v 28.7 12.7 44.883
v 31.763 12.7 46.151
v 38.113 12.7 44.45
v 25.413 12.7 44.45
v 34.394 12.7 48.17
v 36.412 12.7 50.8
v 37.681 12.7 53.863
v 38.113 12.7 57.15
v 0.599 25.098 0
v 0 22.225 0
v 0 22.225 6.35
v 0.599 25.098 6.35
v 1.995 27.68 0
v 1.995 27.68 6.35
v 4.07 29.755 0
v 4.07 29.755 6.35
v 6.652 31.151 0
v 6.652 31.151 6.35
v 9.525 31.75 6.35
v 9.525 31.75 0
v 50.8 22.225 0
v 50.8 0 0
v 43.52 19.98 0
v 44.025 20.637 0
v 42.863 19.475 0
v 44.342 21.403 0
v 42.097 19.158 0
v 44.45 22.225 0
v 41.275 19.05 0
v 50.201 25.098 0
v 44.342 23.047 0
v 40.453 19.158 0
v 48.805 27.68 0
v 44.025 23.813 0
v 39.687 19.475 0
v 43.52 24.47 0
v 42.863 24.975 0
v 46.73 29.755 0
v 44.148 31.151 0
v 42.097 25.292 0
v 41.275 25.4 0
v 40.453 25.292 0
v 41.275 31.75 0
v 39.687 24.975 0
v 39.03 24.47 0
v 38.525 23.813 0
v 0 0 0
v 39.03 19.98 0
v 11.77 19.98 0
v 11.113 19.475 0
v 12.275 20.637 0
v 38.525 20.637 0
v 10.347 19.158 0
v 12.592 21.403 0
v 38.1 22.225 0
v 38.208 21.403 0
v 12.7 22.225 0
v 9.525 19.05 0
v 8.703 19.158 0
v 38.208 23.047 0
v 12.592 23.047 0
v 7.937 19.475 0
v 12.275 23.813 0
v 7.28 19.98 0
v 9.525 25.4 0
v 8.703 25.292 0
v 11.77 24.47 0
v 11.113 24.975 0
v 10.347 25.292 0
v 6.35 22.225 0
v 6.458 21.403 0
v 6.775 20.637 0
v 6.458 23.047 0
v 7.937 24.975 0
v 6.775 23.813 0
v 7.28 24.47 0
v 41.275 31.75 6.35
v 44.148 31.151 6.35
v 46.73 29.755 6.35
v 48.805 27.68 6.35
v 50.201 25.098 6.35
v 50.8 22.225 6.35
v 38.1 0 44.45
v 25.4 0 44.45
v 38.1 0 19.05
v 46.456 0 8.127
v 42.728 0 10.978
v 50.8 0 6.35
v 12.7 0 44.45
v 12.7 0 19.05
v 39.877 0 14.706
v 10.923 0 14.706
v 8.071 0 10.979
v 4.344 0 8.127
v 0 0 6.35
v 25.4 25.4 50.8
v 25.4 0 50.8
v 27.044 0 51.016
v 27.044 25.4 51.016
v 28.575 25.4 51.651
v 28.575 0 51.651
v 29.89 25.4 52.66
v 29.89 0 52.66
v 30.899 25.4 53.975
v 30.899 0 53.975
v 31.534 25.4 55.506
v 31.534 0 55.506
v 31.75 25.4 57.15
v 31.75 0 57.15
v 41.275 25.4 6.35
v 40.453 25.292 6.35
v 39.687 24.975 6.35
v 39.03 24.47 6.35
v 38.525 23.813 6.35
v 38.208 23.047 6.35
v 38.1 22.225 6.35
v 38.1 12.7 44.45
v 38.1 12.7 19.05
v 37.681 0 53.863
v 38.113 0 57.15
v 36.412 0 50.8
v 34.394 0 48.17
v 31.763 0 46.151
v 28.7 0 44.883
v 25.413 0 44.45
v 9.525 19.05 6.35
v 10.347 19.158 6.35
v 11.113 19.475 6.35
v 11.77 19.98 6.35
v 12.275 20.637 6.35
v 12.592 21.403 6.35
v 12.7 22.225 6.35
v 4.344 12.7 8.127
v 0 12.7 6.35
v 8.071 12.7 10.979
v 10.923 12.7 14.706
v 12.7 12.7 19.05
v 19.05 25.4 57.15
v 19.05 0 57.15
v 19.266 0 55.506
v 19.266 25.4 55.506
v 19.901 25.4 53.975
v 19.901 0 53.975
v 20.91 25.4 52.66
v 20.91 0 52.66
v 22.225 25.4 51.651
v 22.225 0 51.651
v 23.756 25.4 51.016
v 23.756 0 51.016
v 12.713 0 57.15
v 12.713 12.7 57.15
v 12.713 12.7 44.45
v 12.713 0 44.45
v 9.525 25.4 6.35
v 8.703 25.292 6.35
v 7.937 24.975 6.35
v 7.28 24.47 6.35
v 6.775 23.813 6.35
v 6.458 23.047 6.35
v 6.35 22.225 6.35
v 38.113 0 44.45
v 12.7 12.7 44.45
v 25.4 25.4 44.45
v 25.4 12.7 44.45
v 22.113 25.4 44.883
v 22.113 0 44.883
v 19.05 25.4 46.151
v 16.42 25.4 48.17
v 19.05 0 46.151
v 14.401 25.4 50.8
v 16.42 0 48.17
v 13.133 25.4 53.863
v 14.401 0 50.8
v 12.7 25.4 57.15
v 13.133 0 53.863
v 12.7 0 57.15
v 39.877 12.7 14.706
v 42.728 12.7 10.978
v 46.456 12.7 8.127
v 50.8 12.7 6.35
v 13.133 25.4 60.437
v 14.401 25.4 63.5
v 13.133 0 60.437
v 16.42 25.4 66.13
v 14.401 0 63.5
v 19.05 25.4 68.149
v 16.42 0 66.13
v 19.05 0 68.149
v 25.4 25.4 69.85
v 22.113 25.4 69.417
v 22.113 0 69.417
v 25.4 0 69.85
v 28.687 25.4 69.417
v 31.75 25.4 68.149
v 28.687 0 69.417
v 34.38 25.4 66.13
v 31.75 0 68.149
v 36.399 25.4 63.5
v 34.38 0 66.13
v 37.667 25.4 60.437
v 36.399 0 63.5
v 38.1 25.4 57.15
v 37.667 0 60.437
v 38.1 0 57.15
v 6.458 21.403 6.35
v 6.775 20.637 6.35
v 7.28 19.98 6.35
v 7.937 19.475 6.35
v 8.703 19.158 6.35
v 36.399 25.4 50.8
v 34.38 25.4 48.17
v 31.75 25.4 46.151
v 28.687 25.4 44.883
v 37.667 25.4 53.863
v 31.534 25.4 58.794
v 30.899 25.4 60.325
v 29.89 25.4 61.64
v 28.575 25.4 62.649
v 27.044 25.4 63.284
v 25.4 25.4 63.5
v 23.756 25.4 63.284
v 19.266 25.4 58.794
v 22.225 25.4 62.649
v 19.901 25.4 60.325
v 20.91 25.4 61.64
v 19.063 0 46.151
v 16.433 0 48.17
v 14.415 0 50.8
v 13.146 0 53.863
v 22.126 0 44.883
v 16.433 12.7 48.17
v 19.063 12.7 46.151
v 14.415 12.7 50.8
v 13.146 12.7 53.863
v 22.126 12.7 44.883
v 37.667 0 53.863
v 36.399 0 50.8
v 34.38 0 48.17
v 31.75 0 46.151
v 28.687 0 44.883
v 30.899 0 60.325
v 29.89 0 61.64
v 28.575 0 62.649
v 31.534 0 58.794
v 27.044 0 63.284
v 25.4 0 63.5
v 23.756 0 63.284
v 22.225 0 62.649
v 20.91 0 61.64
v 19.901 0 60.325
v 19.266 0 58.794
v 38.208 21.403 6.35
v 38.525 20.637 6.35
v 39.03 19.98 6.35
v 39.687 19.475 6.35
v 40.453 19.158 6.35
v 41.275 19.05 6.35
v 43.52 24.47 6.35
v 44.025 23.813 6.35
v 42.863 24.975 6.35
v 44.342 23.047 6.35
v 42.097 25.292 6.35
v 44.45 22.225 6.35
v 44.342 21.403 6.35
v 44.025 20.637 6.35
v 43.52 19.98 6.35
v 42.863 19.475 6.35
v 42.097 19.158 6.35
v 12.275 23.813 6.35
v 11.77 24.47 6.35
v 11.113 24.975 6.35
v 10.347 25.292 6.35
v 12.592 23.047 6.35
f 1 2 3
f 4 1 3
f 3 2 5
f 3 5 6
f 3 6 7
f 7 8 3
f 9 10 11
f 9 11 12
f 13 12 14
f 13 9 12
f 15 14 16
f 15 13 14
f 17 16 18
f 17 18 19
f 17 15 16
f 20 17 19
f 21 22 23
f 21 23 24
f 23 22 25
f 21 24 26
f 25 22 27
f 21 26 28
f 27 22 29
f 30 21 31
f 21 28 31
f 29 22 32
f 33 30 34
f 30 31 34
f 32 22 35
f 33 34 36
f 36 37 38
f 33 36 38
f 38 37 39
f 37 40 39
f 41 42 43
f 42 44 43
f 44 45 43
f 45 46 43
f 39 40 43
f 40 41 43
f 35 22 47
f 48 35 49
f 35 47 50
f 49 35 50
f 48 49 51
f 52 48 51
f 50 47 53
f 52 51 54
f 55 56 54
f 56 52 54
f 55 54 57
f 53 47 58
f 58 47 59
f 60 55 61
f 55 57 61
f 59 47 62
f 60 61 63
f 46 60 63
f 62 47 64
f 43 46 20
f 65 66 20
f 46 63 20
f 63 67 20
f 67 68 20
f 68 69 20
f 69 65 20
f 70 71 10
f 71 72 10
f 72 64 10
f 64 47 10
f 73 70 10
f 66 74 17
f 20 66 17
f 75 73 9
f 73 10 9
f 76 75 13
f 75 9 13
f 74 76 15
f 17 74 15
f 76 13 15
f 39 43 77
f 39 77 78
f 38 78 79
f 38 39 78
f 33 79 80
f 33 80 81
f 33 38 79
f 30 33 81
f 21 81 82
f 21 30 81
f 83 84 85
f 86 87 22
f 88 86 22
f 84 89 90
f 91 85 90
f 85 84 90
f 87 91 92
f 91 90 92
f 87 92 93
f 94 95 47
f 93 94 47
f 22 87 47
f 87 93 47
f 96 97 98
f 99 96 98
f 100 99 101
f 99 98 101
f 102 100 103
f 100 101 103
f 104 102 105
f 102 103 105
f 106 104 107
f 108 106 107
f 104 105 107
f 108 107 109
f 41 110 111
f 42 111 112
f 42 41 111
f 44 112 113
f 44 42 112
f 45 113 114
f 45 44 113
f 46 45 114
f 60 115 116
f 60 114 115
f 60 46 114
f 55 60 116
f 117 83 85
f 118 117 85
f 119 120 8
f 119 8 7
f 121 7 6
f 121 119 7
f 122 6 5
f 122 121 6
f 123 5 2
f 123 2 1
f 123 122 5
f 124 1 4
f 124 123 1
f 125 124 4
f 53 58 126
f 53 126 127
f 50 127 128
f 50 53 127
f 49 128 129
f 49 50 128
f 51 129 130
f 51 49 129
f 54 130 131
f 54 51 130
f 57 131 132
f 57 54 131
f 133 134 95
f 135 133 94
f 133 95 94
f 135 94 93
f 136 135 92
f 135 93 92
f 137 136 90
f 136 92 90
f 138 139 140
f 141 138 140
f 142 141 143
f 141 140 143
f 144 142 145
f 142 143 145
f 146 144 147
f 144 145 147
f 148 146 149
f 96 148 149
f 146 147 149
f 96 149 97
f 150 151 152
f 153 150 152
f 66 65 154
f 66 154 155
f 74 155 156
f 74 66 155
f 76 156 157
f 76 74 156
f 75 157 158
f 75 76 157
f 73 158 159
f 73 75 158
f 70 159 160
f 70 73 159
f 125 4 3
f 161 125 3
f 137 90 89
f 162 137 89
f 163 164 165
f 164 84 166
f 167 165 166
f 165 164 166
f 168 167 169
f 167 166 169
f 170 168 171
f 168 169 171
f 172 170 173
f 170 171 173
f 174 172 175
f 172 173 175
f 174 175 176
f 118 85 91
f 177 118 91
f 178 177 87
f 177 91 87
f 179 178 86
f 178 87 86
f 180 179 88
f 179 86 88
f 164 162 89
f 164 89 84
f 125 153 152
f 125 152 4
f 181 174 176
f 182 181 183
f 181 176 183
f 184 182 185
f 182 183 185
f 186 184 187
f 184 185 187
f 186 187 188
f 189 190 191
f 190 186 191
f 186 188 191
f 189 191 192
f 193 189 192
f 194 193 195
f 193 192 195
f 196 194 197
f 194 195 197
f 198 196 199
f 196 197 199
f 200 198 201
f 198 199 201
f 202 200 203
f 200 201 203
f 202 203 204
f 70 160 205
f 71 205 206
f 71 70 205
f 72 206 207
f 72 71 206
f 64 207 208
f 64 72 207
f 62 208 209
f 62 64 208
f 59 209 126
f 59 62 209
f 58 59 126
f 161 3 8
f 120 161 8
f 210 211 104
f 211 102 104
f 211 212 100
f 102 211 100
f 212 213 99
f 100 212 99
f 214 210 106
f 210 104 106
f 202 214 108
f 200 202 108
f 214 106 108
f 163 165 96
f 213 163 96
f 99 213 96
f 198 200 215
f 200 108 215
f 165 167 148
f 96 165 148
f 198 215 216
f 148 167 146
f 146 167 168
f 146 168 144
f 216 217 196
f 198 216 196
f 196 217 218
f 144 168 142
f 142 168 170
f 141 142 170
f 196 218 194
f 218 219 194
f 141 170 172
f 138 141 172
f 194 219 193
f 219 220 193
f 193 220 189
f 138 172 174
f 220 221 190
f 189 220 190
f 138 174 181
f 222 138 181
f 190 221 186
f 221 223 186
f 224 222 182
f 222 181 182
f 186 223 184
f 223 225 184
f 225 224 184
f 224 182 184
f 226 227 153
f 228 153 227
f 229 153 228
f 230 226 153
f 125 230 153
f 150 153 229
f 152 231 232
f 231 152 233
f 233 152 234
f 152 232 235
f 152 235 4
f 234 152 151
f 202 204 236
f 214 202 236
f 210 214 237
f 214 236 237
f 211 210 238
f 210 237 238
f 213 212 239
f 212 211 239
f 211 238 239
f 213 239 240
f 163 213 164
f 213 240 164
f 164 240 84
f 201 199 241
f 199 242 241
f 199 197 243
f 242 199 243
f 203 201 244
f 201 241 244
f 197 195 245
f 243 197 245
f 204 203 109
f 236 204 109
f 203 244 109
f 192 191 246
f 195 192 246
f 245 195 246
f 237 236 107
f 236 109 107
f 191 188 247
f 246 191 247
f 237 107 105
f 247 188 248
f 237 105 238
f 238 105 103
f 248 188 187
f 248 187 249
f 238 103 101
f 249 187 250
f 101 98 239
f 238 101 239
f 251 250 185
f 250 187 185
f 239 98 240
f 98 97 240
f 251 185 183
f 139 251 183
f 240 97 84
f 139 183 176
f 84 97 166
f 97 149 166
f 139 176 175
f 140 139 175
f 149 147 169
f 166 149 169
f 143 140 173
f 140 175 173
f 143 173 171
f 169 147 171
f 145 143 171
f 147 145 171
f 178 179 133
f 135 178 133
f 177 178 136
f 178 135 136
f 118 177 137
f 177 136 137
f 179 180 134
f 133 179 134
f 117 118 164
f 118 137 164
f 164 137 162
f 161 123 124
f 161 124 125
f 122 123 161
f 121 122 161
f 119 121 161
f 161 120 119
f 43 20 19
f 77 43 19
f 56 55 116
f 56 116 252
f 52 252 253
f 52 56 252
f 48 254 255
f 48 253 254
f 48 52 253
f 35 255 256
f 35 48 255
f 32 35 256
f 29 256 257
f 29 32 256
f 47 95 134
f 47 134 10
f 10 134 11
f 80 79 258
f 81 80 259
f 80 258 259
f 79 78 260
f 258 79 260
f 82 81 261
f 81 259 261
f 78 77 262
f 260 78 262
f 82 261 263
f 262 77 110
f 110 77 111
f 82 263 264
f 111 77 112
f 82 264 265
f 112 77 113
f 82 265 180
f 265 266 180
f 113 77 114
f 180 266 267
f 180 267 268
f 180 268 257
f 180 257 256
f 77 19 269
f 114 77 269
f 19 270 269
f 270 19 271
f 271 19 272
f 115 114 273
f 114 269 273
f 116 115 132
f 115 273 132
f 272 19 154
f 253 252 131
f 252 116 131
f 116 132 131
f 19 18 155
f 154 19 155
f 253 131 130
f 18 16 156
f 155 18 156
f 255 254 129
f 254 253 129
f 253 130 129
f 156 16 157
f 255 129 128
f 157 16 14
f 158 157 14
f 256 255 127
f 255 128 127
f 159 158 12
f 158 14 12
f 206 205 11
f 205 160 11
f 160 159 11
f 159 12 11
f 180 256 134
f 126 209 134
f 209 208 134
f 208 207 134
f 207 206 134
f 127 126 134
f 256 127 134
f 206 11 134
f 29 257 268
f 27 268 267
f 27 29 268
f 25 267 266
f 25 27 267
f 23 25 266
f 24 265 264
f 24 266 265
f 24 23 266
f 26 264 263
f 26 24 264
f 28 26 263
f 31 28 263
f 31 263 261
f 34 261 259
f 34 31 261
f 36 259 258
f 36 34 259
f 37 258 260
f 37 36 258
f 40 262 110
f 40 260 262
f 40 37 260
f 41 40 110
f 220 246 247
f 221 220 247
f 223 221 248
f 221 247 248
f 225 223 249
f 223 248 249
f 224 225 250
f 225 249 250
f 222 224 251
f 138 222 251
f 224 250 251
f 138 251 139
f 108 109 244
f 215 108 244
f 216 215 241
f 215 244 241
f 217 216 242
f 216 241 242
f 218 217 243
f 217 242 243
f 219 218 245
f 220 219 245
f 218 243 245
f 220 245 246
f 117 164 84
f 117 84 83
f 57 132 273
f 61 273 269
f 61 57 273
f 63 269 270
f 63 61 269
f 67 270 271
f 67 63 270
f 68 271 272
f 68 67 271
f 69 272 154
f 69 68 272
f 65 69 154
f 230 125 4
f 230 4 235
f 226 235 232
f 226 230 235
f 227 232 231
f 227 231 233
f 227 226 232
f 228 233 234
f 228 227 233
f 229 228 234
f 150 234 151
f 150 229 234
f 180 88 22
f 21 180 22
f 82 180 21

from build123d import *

# Parameters (mm, degrees)
F1_DEPTH = 50.8
F2_W     = 12.7
F2_H     = 25.4
F3_DEPTH = 31.751
F5_DEPTH = 31.751
F7_DEPTH = 12.7
F9_DEPTH = 69.851


with BuildPart() as f1:
    # F0 (on Right) → F1 (new body)
    with BuildSketch(Plane.YZ):
        Polygon((0, 69.85), (0, 0), (31.75, 0), (31.75, 6.35), (12.7, 6.35), (12.7, 44.45), (25.4, 44.45), (25.4, 69.85), align=None)
    extrude(amount=F1_DEPTH)

    # F2 (on Front) → F3 (cut, through all)
    with BuildSketch(Plane.XZ):
        with Locations((44.45, 31.75)):
            Rectangle(F2_W, F2_H)
        with Locations((44.45, 57.15)):
            Rectangle(F2_W, F2_H)
        with BuildLine():
            ThreePointArc((0, 6.35), (8.0714738129, 10.9785261871), (12.7, 19.05))
            Line((12.7, 19.05), (0, 19.05))
            Line((0, 19.05), (0, 6.35))
        make_face()
        with Locations((6.35, 31.75)):
            Rectangle(F2_W, F2_H)
        with BuildLine():
            Line((50.8, 19.05), (38.1, 19.05))
            ThreePointArc((38.1, 19.05), (42.7282391346, 10.9782391346), (50.8, 6.35))
            Line((50.8, 6.35), (50.8, 19.05))
        make_face()
        with Locations((6.35, 57.15)):
            Rectangle(F2_W, F2_H)
    extrude(amount=-F3_DEPTH, mode=Mode.SUBTRACT)

    # F4 (on Front) → F5 (cut, through all)
    with BuildSketch(Plane.XZ):
        with BuildLine():
            Line((38.1, 69.85), (25.4, 69.85))
            ThreePointArc((25.4, 69.85), (34.3802561211, 66.1302561211), (38.1, 57.15))
            Line((38.1, 57.15), (38.1, 69.85))
        make_face()
        with BuildLine():
            ThreePointArc((12.7, 57.15), (16.4197438789, 66.1302561211), (25.4, 69.85))
            Line((25.4, 69.85), (12.7, 69.85))
            Line((12.7, 69.85), (12.7, 57.15))
        make_face()
        with BuildLine():
            ThreePointArc((25.4, 44.45), (16.4197438789, 48.1697438789), (12.7, 57.15))
            Line((12.7, 57.15), (12.7, 44.45))
            Line((12.7, 44.45), (25.4, 44.45))
        make_face()
        with BuildLine():
            Line((38.1, 44.45), (38.1, 57.15))
            ThreePointArc((38.1, 57.15), (34.3802561211, 48.1697438789), (25.4, 44.45))
            Line((25.4, 44.45), (38.1, 44.45))
        make_face()
        with BuildLine():
            Line((25.4, 50.8), (25.4, 57.15))
            Line((25.4, 57.15), (19.05, 57.15))
            ThreePointArc((19.05, 57.15), (20.9098719395, 52.6598719395), (25.4, 50.8))
        make_face()
        with BuildLine():
            Line((31.75, 57.15), (25.4, 57.15))
            Line((25.4, 57.15), (25.4, 50.8))
            ThreePointArc((25.4, 50.8), (29.8901280605, 52.6598719395), (31.75, 57.15))
        make_face()
        with BuildLine():
            ThreePointArc((31.75, 57.15), (29.8901280605, 61.6401280605), (25.4, 63.5))
            Line((25.4, 63.5), (25.4, 57.15))
            Line((25.4, 57.15), (31.75, 57.15))
        make_face()
        with BuildLine():
            Line((25.4, 57.15), (25.4, 63.5))
            ThreePointArc((25.4, 63.5), (20.9098719395, 61.6401280605), (19.05, 57.15))
            Line((19.05, 57.15), (25.4, 57.15))
        make_face()
    extrude(amount=-F5_DEPTH, mode=Mode.SUBTRACT)

    # F8 (on Top) → F9 (cut, through all)
    with BuildSketch(Plane.XY):
        with BuildLine():
            ThreePointArc((6.35, 22.225), (7.2799359697, 19.9799359697), (9.525, 19.05))
            Line((9.525, 19.05), (9.525, 22.225))
            Line((9.525, 22.225), (6.35, 22.225))
        make_face()
        with BuildLine():
            Line((9.525, 25.4), (9.525, 22.225))
            Line((9.525, 22.225), (12.7, 22.225))
            ThreePointArc((12.7, 22.225), (11.7700640303, 24.4700640303), (9.525, 25.4))
        make_face()
        with BuildLine():
            Line((38.1, 22.225), (41.275, 22.225))
            Line((41.275, 22.225), (41.275, 25.4))
            ThreePointArc((41.275, 25.4), (39.0299359697, 24.4700640303), (38.1, 22.225))
        make_face()
        with BuildLine():
            Line((41.275, 22.225), (41.275, 19.05))
            ThreePointArc((41.275, 19.05), (43.5200640303, 19.9799359697), (44.45, 22.225))
            Line((44.45, 22.225), (41.275, 22.225))
        make_face()
        with BuildLine():
            Line((6.35, 22.225), (9.525, 22.225))
            Line((9.525, 22.225), (9.525, 25.4))
            ThreePointArc((9.525, 25.4), (7.2799359697, 24.4700640303), (6.35, 22.225))
        make_face()
        with BuildLine():
            Line((9.525, 22.225), (9.525, 19.05))
            ThreePointArc((9.525, 19.05), (11.7700640303, 19.9799359697), (12.7, 22.225))
            Line((12.7, 22.225), (9.525, 22.225))
        make_face()
        with BuildLine():
            ThreePointArc((38.1, 22.225), (39.0299359697, 19.9799359697), (41.275, 19.05))
            Line((41.275, 19.05), (41.275, 22.225))
            Line((41.275, 22.225), (38.1, 22.225))
        make_face()
        with BuildLine():
            Line((41.275, 25.4), (41.275, 22.225))
            Line((41.275, 22.225), (44.45, 22.225))
            ThreePointArc((44.45, 22.225), (43.5200640303, 24.4700640303), (41.275, 25.4))
        make_face()
        with BuildLine():
            Line((0, 31.75), (0, 22.225))
            ThreePointArc((0, 22.225), (2.957086208, 28.792913792), (9.525, 31.75))
            Line((9.525, 31.75), (0, 31.75))
        make_face()
        with BuildLine():
            ThreePointArc((41.275, 31.75), (47.842913792, 28.792913792), (50.8, 22.225))
            Line((50.8, 22.225), (50.8, 31.75))
            Line((50.8, 31.75), (41.275, 31.75))
        make_face()
    extrude(amount=F9_DEPTH, mode=Mode.SUBTRACT)


with BuildPart() as f7:
    # F6 (on Front) → F7 (new body)
    with BuildSketch(Plane.XZ):
        with BuildLine():
            ThreePointArc((25.413307827, 44.45), (16.4330517059, 48.1697438789), (12.713307827, 57.15))
            Line((12.713307827, 57.15), (12.713307827, 44.45))
            Line((12.713307827, 44.45), (25.413307827, 44.45))
        make_face()
    extrude(amount=-F7_DEPTH)


with BuildPart() as f7b:
    # F6 (on Front) → F7, piece 2 (new body)
    with BuildSketch(Plane.XZ):
        with BuildLine():
            Line((38.113307827, 44.45), (38.113307827, 57.15))
            ThreePointArc((38.113307827, 57.15), (34.393563948, 48.1697438789), (25.413307827, 44.45))
            Line((25.413307827, 44.45), (38.113307827, 44.45))
        make_face()
    extrude(amount=-F7_DEPTH)


solid = Compound([f1.part, f7.part, f7b.part])
